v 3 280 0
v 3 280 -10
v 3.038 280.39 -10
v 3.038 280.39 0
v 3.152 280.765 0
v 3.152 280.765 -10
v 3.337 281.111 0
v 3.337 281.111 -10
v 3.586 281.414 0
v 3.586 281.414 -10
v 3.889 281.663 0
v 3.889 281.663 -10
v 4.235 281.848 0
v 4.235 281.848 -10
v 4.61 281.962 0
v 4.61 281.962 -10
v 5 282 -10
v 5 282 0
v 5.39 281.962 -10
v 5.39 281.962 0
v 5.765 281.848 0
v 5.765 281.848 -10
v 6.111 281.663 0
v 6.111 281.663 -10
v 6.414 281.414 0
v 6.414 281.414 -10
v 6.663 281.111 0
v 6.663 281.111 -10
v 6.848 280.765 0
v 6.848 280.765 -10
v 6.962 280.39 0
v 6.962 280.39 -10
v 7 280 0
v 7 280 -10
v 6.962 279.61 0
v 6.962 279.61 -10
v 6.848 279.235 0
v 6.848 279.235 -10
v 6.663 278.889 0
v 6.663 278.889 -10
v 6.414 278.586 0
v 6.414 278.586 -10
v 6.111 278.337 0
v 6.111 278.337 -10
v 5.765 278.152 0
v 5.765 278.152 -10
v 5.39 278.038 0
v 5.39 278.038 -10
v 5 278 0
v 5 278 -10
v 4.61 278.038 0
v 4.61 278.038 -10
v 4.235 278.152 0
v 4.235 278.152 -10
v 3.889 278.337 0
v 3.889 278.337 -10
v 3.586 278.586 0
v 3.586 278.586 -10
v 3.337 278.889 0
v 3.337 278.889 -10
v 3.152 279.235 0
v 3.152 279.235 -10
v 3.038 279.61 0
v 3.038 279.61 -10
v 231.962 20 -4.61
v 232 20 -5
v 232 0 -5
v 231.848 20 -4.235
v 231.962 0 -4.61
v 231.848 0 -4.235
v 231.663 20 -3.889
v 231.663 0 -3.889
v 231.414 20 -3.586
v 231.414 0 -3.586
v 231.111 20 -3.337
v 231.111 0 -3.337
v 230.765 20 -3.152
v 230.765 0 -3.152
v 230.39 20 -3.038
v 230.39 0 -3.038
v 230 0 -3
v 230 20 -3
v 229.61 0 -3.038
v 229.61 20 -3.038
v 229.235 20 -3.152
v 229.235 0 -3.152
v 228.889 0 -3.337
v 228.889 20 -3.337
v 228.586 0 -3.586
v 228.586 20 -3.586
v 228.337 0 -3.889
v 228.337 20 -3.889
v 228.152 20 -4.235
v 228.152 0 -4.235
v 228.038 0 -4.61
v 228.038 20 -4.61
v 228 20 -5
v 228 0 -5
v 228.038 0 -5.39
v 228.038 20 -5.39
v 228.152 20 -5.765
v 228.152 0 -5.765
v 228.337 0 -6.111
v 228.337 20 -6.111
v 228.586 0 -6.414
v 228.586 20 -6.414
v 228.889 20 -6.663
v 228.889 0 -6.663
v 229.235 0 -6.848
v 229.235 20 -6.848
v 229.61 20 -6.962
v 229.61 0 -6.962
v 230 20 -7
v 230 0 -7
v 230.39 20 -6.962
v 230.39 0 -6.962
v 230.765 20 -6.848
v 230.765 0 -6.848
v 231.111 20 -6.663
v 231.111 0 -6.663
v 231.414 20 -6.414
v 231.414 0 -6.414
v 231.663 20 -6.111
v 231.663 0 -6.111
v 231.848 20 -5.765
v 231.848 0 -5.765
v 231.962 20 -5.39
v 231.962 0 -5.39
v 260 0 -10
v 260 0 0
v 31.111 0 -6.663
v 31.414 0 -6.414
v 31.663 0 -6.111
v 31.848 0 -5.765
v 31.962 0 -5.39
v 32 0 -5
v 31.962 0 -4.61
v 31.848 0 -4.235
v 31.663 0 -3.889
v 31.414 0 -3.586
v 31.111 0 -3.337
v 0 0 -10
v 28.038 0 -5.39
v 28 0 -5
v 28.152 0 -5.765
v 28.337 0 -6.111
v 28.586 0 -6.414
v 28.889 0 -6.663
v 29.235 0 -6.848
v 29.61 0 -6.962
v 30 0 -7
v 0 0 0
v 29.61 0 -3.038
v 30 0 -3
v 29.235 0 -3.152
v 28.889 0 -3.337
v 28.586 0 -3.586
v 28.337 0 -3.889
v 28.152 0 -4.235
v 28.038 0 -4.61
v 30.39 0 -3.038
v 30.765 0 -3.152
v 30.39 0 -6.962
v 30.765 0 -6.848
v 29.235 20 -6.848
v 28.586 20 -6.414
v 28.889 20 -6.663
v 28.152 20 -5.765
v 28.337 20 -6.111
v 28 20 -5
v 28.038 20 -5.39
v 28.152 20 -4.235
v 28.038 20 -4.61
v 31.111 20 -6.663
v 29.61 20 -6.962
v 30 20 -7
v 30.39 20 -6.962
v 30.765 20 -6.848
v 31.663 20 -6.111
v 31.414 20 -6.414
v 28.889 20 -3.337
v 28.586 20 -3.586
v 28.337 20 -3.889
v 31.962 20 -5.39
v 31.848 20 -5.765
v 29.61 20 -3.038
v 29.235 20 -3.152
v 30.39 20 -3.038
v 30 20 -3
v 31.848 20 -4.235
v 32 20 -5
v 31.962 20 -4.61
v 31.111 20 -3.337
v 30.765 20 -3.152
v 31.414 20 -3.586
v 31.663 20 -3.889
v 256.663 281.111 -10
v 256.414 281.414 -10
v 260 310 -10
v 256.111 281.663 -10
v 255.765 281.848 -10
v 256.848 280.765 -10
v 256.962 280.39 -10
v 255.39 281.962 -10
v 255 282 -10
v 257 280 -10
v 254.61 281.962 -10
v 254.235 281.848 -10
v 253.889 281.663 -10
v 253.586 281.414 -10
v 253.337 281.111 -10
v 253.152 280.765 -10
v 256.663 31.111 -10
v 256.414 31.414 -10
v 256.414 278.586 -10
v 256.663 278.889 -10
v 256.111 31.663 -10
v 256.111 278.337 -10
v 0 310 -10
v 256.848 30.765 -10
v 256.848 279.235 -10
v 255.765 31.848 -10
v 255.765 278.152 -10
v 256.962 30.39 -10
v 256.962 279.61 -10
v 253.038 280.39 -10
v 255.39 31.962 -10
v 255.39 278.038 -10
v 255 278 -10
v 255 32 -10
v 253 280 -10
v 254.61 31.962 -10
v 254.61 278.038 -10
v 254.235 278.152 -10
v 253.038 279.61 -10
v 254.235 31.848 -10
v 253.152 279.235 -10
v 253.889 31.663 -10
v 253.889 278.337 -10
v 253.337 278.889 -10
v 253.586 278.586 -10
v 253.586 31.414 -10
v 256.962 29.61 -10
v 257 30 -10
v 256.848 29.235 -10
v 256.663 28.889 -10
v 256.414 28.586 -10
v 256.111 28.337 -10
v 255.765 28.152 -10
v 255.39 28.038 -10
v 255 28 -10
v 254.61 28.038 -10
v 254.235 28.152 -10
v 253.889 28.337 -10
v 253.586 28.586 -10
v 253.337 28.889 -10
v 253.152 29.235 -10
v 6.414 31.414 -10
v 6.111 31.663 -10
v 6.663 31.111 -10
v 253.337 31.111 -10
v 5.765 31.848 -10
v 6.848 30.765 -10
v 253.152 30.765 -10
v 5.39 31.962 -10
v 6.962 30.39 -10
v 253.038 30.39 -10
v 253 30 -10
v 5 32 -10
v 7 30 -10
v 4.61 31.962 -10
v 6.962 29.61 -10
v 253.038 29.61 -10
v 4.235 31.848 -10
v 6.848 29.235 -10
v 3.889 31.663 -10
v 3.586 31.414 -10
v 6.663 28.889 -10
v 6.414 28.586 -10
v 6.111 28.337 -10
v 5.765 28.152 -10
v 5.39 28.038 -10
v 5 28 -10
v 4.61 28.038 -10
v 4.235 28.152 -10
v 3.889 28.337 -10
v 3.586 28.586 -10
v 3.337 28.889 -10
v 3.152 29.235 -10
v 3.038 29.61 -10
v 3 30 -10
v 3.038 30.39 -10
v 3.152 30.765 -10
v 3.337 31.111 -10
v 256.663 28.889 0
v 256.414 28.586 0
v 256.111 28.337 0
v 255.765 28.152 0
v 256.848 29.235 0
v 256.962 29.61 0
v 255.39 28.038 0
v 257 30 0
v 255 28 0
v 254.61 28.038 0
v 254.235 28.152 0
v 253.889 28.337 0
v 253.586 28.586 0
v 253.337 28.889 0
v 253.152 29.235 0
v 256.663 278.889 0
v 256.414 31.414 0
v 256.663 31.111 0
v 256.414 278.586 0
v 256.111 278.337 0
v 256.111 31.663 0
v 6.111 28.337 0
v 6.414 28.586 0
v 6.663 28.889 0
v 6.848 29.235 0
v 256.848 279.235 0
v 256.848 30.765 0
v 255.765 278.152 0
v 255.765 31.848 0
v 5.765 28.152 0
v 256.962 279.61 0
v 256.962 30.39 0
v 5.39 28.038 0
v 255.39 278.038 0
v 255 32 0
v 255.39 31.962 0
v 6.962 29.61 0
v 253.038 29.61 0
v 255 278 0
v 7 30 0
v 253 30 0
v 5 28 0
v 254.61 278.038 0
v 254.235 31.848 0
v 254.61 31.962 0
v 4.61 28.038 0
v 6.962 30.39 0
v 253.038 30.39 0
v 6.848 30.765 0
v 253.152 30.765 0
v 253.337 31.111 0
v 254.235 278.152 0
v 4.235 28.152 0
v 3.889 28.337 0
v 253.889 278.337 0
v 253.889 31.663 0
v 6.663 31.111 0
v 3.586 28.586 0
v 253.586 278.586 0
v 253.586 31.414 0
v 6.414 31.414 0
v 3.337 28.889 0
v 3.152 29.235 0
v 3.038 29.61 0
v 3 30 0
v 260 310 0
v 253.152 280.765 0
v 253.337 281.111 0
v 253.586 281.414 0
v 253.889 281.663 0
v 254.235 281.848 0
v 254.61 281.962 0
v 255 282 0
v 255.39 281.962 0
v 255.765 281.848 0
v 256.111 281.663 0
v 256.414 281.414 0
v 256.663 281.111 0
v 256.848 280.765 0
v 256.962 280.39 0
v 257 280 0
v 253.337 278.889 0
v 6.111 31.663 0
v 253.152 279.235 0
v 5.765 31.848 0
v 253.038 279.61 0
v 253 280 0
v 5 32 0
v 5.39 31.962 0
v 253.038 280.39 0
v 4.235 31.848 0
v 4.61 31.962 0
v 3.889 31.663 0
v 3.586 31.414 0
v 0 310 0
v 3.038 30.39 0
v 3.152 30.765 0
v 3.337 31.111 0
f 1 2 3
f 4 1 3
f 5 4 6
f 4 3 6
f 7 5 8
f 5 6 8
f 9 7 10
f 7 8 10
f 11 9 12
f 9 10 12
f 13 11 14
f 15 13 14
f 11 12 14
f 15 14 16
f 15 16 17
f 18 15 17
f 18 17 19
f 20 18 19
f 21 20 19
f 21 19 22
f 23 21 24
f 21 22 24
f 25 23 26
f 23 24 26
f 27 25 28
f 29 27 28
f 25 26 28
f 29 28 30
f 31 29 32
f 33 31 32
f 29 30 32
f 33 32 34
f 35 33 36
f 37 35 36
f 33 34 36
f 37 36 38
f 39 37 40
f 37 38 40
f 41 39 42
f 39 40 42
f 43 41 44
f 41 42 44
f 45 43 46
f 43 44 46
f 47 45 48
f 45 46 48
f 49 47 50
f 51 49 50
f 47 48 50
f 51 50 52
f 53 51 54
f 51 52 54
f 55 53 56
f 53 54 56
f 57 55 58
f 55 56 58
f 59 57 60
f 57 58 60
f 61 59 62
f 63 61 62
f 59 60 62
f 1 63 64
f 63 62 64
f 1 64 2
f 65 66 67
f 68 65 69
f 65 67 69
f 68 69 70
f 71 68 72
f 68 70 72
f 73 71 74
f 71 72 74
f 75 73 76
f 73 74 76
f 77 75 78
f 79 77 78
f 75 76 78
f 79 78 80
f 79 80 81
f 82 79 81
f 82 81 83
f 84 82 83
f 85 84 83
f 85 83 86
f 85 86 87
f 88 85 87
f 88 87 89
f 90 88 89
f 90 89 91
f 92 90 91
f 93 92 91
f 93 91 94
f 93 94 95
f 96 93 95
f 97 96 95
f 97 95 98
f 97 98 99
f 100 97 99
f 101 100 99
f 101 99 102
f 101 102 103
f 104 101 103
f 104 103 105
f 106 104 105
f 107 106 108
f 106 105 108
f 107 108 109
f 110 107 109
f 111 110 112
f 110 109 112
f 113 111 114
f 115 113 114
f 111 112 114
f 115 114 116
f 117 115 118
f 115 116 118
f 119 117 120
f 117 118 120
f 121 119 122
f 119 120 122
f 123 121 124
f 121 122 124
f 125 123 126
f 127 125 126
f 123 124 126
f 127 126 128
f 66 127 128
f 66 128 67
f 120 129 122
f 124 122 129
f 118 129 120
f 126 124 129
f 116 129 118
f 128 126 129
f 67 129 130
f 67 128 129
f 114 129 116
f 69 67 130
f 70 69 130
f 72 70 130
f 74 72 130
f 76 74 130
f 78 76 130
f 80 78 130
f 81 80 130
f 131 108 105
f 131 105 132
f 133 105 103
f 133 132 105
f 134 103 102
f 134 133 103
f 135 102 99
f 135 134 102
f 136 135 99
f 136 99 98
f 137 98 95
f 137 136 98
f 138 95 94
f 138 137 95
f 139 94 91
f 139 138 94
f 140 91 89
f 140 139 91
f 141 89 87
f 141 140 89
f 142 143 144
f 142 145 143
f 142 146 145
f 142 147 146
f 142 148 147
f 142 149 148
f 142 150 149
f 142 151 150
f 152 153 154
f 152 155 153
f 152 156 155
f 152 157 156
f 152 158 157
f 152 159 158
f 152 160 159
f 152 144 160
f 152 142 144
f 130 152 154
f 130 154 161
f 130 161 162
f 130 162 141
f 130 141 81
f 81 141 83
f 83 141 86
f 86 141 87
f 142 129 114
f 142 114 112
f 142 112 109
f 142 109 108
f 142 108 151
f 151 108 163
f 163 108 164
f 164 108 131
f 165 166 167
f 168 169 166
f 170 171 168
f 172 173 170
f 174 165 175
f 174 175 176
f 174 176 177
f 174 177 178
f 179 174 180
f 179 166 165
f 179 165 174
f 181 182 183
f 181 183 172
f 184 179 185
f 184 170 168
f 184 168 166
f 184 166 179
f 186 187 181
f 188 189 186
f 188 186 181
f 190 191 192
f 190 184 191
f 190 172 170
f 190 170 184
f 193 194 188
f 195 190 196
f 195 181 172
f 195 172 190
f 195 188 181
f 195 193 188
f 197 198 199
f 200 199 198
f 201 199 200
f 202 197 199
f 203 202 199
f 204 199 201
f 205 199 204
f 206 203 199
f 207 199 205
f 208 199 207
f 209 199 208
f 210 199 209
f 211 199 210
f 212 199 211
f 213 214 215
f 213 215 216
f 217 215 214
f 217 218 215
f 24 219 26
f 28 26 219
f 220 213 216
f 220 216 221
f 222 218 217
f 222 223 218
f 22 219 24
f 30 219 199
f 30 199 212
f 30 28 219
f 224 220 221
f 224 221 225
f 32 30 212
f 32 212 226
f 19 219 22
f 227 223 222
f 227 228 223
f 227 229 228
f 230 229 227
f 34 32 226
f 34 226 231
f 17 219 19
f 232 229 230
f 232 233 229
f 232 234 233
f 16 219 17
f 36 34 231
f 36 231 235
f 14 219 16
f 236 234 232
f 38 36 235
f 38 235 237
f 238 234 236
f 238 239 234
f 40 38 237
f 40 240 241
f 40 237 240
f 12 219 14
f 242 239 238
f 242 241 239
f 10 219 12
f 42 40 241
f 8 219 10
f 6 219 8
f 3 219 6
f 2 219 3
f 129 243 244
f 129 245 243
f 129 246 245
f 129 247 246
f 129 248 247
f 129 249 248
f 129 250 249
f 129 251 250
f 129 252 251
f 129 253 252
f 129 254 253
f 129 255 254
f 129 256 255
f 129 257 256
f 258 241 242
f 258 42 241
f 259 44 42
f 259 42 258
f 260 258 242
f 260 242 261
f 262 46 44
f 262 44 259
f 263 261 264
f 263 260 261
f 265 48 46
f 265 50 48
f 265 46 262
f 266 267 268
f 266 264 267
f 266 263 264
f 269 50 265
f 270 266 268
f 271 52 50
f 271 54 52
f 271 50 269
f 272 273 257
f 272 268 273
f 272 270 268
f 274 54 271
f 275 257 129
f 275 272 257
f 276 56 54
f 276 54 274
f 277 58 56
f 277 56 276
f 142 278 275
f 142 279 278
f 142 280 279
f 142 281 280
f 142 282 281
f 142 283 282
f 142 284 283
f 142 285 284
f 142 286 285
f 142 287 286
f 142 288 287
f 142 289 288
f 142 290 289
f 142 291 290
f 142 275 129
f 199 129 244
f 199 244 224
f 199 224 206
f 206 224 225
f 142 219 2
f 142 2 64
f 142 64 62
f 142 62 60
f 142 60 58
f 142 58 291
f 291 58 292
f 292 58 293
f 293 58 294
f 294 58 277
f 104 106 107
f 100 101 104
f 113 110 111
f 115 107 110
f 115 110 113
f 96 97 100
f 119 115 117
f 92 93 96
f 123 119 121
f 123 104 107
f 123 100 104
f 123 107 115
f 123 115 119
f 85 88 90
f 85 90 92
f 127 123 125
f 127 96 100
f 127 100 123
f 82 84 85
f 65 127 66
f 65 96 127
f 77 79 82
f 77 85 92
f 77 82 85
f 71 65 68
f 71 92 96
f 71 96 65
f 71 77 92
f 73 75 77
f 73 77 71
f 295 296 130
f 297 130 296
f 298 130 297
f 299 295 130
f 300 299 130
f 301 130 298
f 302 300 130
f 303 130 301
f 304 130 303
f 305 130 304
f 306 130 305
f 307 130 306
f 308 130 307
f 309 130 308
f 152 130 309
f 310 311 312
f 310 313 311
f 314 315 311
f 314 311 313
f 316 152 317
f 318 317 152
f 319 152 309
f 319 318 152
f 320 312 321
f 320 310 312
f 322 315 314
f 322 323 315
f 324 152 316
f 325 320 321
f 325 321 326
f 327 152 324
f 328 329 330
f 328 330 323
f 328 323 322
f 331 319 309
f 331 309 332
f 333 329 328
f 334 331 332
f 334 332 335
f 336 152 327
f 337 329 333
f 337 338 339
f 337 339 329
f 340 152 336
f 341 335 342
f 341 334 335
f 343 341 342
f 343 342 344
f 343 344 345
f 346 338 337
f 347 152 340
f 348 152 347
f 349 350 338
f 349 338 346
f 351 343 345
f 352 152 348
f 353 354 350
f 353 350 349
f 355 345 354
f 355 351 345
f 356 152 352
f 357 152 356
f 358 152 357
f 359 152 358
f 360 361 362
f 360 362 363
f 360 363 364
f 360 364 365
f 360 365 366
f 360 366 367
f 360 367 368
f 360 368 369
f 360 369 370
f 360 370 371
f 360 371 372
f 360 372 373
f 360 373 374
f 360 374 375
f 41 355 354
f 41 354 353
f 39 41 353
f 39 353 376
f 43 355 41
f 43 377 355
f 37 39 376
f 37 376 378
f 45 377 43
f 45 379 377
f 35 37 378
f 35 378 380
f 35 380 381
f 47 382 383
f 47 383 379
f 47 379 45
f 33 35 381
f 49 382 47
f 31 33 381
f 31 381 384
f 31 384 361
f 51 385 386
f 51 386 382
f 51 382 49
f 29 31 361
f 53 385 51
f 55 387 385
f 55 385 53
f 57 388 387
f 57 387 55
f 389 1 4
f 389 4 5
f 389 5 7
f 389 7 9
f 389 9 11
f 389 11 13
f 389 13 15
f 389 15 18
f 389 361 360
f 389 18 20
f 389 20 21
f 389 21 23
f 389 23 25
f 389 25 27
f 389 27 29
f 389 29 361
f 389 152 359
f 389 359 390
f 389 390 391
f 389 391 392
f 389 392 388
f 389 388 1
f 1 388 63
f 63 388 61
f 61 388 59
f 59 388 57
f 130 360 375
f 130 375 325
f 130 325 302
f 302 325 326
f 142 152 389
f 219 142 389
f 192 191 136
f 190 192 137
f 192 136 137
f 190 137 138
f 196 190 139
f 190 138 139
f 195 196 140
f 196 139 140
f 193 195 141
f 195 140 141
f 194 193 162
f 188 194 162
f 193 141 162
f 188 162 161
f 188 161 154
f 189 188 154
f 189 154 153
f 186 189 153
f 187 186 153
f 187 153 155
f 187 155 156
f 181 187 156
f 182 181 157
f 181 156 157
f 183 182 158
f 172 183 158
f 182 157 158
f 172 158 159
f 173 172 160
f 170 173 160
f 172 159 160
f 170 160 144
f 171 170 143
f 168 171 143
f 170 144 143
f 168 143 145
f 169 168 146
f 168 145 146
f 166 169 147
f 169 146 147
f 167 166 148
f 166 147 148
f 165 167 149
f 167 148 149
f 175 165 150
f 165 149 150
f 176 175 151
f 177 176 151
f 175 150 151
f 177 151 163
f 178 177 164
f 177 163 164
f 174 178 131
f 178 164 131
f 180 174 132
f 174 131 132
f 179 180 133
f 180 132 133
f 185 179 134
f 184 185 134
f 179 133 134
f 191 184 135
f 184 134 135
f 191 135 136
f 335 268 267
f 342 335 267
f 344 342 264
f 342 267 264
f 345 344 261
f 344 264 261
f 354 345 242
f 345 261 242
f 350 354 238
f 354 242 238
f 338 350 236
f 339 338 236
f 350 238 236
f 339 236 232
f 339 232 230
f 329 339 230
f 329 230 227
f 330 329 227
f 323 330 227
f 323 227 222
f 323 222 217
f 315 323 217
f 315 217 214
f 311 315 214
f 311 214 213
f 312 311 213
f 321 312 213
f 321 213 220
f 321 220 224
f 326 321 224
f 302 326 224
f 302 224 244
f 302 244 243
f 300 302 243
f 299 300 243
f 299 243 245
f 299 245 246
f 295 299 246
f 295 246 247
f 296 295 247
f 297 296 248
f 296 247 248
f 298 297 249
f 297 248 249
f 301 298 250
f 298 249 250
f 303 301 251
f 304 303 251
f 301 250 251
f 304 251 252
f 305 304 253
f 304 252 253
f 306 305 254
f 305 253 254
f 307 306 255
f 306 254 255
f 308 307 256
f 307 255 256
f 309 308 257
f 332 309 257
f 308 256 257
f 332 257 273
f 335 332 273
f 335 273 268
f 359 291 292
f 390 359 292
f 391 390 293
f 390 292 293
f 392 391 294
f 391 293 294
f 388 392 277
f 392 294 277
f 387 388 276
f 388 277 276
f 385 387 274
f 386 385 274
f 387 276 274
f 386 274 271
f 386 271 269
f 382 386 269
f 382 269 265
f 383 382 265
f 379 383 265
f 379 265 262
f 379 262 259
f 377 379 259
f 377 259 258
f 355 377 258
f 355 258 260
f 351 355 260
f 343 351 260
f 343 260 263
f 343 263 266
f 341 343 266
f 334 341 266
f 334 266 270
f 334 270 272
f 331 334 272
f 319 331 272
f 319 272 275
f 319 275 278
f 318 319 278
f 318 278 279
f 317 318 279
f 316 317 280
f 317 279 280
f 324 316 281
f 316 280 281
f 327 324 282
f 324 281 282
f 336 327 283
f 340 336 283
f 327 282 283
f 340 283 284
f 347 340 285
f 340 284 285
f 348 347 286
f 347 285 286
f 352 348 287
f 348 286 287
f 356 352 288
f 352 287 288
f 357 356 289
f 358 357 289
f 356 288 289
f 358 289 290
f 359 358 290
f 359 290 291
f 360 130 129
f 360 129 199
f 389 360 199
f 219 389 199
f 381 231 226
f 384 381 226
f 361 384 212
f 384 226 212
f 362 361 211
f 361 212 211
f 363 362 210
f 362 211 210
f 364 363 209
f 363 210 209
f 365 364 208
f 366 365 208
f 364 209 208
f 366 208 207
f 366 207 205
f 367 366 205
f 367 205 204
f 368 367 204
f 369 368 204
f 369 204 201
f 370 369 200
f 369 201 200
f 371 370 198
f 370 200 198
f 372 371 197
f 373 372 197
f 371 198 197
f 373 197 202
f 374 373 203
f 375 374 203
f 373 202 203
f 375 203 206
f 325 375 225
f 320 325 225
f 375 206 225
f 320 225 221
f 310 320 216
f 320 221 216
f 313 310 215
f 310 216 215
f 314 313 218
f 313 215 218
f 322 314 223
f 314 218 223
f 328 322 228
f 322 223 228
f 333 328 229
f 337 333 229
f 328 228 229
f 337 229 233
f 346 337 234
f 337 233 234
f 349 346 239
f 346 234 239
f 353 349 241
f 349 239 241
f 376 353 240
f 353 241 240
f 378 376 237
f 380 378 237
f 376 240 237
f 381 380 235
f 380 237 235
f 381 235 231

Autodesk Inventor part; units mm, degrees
ref_plane "YZ Plane" through (0, 0, 0) normal (1, 0, 0) x (0, 1, 0)
ref_plane "XZ Plane" through (0, 0, 0) normal (0, 1, 0) x (-1, 0, 0)
ref_plane "XY Plane" through (0, 0, 0) normal (0, 0, 1) x (1, 0, 0)
sketch "Sketch1" plane through (0, 0, 0) normal (1, 0, 0) x (0, 1, 0)
  line L0 (0, 0) -> (310, 0)
  line L1 (310, 0) -> (310, -10)
  line L2 (310, -10) -> (0, -10)
  line L3 (0, -10) -> (0, 0)
  dimension "d0" = 310
  dimension "d1" = 10
extrude "Extrusion1" add sketch "Sketch1" along normal blind 260
sketch "Sketch2" plane through (0, 0, -10) normal (0, 0, -1) x (-1, 0, 0)
  circle A0 centre (-255, 280) radius 2
  line L0 (-260, 0) -> (-260, 310) projected
  line L1 (0, 310) -> (-260, 310) projected
  circle A1 centre (-255, 30) radius 2
  circle A2 centre (-5, 280) radius 2
  circle A3 centre (-5, 30) radius 2
  point P0 (0, 0)
  dimension "d4" = 4
  dimension "d5" = 5
  dimension "d6" = 30
  dimension "d9" = 250
  dimension "d12" = 250
extrude "Extrusion2" cut sketch "Sketch2" against normal through all
sketch "Sketch3" plane through (0, 0, -10) normal (0, -1, 0) x (1, 0, 0)
  circle A0 centre (30, 5) radius 2
  line L0 (0, 0) -> (260, 0) projected
  line L1 (0, 0) -> (0, 10) projected
  circle A1 centre (230, 5) radius 2
  dimension "d17" = 4
  dimension "d18" = 5
  dimension "d19" = 30
  dimension "d22" = 200
extrude "Extrusion3" cut sketch "Sketch3" against normal blind 20
properties part number "box_back"
